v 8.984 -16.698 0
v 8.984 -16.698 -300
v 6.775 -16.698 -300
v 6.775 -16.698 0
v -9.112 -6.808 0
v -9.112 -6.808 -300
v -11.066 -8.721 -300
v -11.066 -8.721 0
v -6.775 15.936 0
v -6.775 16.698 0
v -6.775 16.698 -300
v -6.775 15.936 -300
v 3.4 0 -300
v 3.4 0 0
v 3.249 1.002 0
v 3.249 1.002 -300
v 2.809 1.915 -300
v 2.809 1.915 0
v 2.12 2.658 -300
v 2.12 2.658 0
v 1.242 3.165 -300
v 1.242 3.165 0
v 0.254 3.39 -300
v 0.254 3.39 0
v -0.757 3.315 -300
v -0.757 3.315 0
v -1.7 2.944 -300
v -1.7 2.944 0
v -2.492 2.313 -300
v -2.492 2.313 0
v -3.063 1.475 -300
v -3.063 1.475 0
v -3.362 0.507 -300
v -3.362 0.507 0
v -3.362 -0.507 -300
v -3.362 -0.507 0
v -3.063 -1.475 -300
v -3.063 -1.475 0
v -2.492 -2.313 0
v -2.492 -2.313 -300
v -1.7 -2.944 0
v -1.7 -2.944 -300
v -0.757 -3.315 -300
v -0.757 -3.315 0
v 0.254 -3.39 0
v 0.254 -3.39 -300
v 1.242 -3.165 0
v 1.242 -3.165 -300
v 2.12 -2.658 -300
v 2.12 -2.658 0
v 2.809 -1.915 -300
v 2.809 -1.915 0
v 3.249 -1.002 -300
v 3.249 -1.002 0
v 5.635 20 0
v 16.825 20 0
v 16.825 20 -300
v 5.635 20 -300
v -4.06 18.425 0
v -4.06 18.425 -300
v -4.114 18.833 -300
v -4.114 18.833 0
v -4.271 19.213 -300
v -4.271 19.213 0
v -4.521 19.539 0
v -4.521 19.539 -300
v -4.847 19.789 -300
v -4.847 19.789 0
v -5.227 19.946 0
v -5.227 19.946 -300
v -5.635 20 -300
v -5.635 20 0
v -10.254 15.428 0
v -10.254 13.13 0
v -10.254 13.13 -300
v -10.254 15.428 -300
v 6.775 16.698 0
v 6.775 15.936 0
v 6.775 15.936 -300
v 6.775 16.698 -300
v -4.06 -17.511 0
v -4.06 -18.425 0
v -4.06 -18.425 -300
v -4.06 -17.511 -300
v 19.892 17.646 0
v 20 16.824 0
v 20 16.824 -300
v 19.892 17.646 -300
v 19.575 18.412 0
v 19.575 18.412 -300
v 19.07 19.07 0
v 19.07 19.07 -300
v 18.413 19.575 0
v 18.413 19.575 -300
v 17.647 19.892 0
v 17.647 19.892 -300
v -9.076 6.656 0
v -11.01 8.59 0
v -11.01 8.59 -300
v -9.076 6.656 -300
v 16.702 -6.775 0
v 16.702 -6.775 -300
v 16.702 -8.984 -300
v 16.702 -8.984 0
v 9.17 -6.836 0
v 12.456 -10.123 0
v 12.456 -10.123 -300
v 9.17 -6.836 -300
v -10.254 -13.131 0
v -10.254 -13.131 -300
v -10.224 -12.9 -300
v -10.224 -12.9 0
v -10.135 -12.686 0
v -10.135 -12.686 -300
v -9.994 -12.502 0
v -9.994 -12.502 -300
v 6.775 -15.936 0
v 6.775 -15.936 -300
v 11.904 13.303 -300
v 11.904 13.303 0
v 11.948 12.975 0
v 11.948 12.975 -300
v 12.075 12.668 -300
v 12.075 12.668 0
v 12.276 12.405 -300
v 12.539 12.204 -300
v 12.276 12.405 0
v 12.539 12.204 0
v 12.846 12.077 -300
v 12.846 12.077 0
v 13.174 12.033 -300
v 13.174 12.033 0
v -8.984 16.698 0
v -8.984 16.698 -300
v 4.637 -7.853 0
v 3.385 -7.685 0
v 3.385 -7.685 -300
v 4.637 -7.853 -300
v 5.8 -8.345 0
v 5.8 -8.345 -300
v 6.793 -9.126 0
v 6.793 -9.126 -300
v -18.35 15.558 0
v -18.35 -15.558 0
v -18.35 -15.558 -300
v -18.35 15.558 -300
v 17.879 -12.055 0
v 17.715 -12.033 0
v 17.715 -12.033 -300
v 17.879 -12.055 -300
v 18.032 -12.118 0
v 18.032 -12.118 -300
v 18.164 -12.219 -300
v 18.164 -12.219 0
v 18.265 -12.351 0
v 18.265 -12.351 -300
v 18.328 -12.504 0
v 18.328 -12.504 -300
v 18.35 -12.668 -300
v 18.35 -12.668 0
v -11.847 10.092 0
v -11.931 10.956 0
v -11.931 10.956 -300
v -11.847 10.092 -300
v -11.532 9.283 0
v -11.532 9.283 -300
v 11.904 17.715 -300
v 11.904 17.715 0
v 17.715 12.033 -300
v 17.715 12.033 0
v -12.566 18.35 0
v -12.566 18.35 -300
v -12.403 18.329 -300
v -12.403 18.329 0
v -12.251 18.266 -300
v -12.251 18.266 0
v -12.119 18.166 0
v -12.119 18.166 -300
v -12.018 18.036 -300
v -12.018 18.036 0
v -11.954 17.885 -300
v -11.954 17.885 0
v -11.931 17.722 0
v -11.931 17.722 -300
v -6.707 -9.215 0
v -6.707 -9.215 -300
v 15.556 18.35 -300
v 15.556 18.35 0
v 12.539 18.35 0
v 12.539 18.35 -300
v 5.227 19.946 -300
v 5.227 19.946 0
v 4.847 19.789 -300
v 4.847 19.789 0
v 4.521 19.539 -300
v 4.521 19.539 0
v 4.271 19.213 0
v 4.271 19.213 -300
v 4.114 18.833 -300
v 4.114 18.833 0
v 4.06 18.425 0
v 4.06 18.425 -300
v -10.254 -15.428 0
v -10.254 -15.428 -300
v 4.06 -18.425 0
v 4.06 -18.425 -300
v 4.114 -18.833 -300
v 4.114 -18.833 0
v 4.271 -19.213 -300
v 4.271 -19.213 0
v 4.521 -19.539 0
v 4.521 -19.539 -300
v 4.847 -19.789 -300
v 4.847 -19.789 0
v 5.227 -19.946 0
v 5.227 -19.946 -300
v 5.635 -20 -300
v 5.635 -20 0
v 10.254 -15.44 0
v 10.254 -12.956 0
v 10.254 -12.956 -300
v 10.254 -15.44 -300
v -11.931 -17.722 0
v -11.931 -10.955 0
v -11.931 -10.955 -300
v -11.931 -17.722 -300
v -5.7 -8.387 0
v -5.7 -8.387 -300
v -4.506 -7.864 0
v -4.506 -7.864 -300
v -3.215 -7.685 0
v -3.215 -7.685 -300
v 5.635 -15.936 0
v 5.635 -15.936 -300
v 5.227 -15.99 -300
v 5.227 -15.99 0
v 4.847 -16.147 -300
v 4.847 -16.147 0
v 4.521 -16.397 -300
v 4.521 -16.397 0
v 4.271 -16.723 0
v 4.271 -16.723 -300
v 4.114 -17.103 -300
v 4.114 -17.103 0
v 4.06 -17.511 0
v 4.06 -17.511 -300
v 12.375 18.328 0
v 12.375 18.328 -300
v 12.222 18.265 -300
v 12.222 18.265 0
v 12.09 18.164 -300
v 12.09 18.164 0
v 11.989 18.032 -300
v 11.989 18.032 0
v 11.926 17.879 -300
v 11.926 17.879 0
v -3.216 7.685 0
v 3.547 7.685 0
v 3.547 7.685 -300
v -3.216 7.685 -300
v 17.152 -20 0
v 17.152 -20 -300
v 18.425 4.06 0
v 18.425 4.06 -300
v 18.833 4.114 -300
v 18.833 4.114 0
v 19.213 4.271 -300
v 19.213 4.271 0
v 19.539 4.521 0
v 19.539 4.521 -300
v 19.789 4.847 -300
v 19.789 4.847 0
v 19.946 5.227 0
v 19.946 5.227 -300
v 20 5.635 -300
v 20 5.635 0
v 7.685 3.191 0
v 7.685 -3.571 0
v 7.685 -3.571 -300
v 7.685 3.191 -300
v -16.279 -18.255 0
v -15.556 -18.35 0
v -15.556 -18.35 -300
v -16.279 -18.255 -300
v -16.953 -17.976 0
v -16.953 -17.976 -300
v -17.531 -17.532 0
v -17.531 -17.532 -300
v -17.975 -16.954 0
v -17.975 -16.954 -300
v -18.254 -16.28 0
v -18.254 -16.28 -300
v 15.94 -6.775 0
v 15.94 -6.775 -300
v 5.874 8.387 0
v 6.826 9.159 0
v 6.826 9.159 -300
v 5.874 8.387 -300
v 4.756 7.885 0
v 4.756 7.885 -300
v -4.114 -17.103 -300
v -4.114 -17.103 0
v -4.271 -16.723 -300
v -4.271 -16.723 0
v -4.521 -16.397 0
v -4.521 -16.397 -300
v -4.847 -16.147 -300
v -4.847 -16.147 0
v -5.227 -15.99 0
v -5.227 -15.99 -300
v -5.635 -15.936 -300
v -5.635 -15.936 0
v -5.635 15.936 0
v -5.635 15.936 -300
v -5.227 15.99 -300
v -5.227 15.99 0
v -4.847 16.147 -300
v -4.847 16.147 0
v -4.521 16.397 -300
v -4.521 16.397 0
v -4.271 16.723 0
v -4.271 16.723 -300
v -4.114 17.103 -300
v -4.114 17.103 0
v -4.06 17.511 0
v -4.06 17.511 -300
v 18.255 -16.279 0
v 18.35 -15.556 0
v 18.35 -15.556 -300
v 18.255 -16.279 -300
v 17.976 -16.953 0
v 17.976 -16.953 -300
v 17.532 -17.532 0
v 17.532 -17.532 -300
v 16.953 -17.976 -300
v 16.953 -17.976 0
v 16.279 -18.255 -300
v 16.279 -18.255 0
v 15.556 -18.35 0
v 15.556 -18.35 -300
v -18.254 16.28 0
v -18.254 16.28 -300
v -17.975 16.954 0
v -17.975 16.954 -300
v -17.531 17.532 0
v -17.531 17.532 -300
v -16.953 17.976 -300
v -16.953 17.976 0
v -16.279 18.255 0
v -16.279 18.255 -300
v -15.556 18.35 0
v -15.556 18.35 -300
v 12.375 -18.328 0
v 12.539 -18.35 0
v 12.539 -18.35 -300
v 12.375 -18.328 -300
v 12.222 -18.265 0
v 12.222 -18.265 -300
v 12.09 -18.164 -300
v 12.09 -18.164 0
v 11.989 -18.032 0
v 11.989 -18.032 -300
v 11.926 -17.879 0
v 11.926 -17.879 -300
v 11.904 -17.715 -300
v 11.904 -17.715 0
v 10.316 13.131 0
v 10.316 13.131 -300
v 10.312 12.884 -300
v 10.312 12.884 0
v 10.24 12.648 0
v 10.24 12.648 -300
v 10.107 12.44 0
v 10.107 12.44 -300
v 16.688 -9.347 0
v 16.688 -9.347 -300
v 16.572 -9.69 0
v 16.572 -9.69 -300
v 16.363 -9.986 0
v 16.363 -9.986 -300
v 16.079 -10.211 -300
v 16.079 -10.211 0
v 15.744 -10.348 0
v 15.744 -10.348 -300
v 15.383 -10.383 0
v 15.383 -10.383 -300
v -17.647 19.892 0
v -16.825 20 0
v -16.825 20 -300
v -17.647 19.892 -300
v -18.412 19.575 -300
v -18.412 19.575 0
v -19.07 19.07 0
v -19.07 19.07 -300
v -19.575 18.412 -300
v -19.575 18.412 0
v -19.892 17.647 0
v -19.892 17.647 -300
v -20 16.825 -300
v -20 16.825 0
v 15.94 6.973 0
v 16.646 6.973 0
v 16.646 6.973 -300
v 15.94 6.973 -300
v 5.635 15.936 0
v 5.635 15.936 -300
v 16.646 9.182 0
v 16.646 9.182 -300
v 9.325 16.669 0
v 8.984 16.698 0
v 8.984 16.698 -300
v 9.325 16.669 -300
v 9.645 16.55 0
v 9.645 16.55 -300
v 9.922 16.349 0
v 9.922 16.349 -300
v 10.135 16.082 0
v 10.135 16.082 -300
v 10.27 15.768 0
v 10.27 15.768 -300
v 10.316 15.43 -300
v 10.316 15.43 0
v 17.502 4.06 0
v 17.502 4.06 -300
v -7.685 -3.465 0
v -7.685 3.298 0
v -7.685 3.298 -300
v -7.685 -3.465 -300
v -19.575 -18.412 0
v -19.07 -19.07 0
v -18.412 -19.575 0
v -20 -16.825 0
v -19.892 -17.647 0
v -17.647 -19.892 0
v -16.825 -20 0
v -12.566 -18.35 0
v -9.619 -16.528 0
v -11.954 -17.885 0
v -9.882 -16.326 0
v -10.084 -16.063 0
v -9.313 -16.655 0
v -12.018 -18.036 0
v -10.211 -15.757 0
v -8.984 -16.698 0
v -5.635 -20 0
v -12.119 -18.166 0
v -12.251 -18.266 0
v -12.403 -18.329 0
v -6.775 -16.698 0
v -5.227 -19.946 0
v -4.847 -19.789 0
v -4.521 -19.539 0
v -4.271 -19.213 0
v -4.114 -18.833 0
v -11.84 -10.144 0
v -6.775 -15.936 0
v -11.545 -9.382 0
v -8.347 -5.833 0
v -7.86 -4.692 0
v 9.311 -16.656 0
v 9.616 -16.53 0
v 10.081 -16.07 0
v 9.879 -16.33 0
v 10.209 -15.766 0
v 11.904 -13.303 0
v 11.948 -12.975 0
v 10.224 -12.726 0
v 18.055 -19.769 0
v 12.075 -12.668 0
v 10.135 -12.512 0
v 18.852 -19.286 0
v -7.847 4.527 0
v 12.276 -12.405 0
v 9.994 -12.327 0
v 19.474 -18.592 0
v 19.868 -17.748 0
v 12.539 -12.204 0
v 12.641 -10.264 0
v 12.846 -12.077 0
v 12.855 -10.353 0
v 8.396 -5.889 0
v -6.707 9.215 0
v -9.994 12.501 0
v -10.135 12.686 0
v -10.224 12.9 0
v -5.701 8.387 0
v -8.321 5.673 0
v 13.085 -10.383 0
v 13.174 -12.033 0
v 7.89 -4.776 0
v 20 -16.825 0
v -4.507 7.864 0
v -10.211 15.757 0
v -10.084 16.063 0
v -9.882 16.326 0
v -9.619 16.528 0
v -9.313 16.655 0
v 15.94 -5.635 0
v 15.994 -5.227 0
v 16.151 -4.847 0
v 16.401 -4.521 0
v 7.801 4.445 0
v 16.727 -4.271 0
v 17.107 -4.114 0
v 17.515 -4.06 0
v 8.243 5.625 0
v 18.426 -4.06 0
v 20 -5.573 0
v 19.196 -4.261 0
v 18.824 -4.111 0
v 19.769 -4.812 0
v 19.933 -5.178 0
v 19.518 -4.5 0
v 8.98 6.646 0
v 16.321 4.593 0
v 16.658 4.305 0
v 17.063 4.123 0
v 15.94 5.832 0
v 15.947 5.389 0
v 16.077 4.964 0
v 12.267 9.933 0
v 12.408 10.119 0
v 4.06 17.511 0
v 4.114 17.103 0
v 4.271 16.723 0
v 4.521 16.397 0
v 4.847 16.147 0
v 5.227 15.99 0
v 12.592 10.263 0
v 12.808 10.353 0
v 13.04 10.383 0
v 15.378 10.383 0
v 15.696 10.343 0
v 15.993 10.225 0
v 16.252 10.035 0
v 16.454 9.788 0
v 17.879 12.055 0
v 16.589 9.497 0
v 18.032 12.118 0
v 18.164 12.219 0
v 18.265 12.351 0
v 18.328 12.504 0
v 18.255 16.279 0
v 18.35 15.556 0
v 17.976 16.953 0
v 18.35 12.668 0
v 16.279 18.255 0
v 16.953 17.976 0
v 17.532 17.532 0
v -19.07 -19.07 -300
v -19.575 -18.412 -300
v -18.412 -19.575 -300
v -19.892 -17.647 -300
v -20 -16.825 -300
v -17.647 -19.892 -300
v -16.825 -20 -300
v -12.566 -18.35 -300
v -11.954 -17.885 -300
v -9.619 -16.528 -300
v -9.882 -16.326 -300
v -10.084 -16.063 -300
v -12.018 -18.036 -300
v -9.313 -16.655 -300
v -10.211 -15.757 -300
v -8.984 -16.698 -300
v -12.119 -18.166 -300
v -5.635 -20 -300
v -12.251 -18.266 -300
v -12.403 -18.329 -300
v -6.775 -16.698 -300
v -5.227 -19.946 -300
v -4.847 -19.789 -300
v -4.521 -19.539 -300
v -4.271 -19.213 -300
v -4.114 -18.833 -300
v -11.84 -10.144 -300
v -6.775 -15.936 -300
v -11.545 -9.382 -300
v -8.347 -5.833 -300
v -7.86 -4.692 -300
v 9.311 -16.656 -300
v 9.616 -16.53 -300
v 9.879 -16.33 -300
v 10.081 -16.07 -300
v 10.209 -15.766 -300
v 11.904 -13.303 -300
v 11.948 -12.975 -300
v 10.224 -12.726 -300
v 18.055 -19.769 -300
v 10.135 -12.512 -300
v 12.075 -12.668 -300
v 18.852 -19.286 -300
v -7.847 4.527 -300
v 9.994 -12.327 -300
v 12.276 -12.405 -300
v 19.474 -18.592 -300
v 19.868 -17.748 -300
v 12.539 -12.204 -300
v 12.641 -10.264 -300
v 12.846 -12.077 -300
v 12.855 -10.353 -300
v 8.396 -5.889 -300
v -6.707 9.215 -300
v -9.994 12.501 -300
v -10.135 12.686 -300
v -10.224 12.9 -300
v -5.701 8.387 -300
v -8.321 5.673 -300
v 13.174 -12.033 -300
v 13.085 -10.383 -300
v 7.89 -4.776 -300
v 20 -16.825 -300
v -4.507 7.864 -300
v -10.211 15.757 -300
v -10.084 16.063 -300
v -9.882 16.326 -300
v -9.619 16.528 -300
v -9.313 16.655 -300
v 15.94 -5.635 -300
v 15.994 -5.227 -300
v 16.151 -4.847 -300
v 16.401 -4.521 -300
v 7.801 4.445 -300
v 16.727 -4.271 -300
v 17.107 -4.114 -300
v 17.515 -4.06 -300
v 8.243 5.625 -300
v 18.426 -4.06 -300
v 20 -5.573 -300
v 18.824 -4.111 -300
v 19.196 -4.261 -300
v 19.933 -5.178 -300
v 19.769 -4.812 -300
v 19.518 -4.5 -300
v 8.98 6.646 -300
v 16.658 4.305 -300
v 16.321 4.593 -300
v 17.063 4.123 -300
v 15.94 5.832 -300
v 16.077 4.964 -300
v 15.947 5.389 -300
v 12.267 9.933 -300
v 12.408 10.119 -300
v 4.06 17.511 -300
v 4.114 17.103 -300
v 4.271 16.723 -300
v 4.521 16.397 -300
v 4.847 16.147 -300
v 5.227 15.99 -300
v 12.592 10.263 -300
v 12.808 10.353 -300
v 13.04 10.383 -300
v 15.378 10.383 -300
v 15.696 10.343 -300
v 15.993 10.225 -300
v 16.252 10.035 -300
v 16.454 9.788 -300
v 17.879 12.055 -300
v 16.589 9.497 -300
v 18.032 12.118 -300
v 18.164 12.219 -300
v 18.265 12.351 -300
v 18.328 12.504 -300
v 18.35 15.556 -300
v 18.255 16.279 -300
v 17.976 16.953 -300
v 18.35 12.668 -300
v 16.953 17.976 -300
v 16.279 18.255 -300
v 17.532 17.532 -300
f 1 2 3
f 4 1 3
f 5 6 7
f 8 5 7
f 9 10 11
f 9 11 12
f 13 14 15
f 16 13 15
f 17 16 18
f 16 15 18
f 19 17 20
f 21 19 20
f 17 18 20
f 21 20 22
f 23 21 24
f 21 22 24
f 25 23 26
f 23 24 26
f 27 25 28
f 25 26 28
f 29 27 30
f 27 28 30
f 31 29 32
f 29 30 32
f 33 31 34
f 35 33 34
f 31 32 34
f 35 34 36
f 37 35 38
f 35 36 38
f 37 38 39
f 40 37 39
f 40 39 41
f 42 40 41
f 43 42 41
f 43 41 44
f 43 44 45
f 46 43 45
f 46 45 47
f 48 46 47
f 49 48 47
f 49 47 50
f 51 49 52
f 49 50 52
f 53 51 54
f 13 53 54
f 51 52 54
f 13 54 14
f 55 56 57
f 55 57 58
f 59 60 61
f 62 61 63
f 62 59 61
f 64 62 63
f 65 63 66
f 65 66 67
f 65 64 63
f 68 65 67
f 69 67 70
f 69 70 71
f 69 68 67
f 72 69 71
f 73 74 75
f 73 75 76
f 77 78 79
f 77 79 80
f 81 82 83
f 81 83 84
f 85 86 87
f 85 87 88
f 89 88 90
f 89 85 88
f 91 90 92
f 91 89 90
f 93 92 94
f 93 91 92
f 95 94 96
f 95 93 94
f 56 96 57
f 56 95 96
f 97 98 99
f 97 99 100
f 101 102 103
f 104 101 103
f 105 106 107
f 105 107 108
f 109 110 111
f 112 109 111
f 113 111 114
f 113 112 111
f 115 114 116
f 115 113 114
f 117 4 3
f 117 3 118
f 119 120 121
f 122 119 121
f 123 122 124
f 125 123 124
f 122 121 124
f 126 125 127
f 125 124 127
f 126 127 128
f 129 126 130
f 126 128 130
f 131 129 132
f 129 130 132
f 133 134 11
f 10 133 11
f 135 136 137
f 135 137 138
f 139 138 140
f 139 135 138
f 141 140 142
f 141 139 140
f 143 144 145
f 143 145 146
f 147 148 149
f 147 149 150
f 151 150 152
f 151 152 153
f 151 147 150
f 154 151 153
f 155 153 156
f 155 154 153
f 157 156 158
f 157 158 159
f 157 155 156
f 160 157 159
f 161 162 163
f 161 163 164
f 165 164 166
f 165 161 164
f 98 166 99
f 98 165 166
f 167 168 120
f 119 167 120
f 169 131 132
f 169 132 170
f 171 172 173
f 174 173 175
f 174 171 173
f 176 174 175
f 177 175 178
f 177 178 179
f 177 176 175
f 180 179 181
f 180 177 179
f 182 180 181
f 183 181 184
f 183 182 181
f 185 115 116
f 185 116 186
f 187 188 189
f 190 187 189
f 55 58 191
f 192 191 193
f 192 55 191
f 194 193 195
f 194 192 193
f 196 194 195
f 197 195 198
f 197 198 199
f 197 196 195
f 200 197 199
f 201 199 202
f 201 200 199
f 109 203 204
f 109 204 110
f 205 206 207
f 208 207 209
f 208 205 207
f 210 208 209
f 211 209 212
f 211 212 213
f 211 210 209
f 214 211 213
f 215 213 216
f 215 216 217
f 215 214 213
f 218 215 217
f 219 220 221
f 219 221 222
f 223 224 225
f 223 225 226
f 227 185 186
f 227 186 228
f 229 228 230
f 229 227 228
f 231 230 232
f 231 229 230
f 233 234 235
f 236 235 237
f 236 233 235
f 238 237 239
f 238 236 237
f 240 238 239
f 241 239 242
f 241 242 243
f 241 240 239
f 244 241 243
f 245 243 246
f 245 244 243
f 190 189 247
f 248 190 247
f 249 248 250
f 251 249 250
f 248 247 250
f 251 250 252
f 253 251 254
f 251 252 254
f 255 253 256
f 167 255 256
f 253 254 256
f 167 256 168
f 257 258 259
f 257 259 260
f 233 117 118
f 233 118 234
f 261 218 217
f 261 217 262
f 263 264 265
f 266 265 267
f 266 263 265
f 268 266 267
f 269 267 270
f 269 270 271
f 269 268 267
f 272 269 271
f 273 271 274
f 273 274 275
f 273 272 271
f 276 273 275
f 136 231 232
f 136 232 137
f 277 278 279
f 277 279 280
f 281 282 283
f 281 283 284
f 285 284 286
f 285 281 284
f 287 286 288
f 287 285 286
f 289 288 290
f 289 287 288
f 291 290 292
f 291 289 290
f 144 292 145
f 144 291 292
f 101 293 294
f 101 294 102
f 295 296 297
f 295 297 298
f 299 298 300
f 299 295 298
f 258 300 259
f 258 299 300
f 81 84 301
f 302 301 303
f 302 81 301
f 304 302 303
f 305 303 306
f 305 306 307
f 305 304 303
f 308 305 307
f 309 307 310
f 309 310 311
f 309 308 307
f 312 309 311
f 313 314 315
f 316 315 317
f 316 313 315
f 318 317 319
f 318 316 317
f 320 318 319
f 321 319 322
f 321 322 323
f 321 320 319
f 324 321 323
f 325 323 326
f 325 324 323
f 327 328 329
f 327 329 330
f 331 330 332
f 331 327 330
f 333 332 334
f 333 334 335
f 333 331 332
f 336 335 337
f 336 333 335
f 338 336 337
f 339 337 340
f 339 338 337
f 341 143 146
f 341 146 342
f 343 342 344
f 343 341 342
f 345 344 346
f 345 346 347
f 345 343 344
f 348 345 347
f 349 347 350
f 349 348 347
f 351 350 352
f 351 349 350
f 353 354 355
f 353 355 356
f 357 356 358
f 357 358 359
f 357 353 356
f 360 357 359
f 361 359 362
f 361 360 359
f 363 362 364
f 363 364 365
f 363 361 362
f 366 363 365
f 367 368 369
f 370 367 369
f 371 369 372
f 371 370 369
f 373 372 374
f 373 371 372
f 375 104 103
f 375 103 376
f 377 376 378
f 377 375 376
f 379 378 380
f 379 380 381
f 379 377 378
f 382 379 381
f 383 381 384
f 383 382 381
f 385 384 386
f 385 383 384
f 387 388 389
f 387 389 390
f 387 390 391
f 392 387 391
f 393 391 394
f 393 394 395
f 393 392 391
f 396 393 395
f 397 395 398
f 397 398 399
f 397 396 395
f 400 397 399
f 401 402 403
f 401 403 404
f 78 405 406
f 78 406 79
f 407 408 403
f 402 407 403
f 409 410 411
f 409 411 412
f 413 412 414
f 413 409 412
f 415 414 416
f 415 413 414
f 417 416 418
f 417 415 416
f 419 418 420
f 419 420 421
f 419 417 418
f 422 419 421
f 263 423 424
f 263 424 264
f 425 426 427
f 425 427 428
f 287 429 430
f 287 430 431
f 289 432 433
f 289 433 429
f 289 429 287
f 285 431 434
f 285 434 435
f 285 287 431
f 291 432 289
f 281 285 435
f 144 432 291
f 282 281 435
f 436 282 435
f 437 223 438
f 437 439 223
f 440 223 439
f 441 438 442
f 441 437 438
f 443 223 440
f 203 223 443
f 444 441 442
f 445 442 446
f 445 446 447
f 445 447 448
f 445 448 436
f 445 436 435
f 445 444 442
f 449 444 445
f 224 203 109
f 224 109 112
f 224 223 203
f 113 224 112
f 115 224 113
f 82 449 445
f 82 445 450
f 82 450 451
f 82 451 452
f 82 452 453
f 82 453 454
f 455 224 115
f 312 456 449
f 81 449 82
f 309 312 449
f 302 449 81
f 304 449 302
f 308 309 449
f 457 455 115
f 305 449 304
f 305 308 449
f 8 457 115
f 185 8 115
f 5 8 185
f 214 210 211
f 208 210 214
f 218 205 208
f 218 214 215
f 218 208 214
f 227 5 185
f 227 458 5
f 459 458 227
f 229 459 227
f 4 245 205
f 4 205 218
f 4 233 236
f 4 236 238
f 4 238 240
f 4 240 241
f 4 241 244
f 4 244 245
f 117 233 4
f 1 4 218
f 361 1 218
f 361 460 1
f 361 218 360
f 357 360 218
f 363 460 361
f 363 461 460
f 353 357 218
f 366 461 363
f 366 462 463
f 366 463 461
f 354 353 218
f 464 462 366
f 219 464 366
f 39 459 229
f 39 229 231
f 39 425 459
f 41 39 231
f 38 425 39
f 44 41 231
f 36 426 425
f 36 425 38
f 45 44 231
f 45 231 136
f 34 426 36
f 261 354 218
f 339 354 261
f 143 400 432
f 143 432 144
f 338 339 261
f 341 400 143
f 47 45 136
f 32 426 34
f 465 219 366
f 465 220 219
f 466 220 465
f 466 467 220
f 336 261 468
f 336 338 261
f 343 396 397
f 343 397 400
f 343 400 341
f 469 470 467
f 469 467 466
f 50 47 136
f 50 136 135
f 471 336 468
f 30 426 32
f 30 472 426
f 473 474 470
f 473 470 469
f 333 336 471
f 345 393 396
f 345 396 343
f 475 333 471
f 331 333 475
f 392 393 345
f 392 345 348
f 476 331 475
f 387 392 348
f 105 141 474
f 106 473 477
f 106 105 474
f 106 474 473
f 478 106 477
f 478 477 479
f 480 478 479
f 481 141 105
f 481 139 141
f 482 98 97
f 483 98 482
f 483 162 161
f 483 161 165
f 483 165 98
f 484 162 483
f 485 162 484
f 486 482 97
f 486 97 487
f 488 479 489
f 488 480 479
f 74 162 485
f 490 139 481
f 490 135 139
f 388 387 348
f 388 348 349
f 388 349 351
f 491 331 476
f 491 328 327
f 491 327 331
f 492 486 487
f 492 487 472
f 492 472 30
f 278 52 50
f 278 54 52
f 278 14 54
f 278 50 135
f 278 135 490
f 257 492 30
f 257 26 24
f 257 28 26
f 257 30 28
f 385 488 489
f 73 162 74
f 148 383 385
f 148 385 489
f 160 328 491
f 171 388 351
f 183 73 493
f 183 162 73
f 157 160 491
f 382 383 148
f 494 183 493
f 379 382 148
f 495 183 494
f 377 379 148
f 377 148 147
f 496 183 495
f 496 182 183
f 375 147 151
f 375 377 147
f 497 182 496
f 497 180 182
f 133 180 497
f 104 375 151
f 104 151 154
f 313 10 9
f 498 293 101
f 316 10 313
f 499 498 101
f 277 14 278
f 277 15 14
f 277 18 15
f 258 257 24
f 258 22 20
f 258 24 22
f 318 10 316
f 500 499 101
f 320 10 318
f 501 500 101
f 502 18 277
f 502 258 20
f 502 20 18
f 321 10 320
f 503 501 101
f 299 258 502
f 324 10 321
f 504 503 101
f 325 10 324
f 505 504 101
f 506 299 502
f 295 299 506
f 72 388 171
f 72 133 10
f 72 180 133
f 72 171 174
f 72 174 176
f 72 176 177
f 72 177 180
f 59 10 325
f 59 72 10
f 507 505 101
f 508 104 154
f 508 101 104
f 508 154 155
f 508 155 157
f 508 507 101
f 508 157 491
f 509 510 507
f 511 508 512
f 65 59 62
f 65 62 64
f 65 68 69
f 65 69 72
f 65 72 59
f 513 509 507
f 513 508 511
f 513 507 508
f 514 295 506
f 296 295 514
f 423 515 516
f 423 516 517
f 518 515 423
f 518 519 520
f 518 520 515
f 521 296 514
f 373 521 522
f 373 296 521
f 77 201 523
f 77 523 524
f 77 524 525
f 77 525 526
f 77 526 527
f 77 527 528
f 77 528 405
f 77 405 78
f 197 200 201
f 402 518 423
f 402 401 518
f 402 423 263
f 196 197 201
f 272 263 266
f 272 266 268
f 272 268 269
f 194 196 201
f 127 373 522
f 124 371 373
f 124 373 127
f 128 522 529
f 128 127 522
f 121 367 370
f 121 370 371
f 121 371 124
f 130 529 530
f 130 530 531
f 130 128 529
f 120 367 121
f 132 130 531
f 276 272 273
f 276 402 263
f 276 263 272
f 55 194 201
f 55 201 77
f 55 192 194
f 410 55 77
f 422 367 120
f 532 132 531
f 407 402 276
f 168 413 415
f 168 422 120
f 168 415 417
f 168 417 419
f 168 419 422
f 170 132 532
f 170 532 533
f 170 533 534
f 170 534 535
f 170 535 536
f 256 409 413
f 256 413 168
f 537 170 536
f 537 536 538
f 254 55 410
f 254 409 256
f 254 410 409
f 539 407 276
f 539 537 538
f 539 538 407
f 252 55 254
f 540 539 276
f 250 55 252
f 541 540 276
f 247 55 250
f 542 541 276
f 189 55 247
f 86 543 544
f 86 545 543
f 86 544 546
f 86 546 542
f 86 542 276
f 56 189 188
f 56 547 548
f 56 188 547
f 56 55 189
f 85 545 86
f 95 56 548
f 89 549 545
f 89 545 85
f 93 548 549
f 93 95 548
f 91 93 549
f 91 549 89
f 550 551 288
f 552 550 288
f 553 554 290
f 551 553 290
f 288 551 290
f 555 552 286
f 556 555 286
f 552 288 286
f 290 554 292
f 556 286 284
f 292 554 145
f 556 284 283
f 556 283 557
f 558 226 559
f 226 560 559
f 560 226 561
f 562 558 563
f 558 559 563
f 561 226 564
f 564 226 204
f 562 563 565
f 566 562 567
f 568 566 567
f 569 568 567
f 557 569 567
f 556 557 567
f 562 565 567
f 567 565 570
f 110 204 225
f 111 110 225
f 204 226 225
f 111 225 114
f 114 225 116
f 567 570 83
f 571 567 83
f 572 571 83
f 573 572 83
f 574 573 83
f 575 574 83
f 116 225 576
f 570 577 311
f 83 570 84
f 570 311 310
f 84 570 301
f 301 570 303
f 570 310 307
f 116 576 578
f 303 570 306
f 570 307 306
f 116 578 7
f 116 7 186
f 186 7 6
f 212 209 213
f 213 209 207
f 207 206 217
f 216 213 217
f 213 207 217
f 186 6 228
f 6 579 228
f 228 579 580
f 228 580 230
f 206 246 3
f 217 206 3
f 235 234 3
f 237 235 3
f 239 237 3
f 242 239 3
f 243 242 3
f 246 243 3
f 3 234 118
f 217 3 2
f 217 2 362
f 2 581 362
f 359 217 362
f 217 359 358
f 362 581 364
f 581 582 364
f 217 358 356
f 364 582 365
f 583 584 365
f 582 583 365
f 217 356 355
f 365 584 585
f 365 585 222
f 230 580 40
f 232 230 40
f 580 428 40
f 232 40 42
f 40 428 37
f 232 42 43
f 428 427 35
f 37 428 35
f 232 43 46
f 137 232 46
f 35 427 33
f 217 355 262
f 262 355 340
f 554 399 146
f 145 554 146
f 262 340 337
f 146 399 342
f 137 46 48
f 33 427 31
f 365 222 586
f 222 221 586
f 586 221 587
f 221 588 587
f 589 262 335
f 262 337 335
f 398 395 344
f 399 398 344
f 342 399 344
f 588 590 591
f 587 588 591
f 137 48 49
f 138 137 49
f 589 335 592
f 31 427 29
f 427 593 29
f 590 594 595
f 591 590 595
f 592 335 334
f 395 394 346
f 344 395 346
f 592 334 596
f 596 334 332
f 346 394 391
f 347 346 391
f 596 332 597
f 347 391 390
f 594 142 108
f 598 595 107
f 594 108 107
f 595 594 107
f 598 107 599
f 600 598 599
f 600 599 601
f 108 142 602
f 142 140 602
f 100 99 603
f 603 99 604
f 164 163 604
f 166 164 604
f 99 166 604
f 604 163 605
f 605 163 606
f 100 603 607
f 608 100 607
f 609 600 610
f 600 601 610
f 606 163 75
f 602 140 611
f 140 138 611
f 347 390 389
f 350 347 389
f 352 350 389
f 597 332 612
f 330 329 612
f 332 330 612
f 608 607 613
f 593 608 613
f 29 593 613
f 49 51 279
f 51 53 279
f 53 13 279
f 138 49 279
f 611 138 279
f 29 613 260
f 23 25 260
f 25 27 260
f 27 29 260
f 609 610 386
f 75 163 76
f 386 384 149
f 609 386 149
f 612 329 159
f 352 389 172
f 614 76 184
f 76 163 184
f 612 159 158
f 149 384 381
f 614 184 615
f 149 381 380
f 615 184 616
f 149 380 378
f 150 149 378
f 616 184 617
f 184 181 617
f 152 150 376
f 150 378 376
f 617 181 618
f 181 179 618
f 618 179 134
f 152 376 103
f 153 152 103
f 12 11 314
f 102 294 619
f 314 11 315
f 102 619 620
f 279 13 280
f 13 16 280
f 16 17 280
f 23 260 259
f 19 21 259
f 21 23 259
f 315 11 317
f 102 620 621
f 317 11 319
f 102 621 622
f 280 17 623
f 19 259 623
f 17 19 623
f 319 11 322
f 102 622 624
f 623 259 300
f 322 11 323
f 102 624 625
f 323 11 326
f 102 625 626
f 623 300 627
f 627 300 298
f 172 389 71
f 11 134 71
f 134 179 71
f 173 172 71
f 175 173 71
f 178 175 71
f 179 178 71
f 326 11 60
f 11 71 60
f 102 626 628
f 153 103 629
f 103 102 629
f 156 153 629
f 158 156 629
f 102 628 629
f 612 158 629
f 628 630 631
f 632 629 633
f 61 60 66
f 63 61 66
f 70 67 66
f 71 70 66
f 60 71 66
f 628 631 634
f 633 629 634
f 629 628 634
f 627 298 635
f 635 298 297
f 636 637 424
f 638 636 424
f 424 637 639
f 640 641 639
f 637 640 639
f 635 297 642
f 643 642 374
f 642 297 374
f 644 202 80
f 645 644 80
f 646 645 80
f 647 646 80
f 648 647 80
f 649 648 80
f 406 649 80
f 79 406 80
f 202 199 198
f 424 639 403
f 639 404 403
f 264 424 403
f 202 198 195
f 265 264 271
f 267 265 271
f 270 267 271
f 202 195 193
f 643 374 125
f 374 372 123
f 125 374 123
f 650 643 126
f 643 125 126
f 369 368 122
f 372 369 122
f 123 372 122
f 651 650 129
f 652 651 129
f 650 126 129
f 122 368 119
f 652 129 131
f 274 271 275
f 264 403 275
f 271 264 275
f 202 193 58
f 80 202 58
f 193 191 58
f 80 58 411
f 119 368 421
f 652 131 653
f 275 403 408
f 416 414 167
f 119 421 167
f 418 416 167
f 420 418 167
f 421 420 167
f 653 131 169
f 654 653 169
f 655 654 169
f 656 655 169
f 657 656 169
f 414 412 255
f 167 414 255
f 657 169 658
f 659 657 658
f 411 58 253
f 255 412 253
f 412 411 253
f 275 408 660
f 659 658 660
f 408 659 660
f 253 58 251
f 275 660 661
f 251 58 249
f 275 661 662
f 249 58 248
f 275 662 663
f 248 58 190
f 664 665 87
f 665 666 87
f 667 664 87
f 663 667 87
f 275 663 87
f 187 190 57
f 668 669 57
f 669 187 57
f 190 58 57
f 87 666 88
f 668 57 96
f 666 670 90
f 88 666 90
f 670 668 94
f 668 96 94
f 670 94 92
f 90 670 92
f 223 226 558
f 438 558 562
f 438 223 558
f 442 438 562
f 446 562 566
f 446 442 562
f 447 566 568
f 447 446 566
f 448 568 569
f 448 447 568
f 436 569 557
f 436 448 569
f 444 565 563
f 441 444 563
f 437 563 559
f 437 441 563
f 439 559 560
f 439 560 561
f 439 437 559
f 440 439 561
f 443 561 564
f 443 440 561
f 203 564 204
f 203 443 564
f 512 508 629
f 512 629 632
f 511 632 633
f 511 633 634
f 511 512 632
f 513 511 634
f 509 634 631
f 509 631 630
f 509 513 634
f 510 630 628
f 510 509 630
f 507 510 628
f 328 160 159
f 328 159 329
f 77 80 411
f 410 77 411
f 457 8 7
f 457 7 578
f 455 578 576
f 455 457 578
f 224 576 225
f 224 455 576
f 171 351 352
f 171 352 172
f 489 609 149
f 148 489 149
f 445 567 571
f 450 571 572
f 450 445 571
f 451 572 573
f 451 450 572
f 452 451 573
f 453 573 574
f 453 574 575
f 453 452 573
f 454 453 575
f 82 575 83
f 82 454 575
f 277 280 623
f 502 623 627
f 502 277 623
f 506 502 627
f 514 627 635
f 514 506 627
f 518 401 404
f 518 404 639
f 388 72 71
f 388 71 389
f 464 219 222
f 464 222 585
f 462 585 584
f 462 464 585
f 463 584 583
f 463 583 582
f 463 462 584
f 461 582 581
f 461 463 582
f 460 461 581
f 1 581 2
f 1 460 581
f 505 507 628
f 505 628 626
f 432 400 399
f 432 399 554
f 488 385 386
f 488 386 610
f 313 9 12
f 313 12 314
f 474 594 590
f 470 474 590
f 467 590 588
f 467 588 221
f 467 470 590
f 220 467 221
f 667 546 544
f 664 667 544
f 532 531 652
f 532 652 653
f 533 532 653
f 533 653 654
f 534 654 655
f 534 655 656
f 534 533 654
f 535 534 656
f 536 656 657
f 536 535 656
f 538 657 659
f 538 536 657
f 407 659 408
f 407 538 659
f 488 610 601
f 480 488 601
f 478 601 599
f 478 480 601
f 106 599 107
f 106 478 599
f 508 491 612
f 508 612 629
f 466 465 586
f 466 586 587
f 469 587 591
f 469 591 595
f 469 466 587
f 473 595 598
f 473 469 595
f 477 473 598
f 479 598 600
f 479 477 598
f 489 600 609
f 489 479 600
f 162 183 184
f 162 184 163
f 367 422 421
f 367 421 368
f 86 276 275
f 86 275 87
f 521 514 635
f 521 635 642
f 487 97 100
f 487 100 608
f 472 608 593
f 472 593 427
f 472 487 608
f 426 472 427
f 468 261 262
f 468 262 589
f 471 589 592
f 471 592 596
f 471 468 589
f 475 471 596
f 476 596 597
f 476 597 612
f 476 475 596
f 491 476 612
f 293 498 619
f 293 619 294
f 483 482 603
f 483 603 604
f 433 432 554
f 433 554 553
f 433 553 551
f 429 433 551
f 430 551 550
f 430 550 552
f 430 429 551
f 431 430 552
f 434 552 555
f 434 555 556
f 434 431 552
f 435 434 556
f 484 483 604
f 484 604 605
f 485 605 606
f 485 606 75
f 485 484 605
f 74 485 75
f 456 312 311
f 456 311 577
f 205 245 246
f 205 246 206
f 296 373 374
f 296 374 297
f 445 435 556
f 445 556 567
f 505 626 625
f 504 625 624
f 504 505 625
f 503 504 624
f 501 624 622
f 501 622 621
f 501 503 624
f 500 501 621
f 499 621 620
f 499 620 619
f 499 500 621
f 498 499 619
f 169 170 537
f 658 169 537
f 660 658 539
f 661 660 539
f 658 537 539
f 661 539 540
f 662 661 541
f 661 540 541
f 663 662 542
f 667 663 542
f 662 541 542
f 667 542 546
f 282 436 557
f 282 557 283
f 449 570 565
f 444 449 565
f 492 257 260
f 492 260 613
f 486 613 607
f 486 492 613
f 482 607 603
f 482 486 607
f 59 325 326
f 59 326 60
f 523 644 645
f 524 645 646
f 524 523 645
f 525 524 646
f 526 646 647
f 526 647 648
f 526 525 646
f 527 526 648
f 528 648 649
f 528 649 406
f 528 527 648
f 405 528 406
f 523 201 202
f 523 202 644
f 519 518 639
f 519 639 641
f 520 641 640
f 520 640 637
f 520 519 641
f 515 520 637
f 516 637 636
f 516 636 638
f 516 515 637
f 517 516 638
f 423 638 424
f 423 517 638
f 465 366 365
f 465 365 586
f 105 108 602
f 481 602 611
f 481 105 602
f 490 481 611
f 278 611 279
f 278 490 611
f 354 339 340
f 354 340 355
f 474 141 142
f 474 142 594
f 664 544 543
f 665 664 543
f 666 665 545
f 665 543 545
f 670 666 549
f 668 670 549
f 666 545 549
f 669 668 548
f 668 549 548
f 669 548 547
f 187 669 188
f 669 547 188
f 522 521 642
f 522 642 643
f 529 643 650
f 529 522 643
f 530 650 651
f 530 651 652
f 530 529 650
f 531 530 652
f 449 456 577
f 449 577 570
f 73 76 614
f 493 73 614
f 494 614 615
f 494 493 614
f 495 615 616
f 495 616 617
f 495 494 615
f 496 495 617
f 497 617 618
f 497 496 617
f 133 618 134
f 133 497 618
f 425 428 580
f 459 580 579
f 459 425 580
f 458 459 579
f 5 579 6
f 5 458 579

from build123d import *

# Parameters (mm, degrees)
SKETCH1_R      = 3.4
EXTRUDE1_DEPTH = 300


with BuildPart() as part:
    # Sketch1 → Extrude1 (new body)
    with BuildSketch(Plane.XY):
        with BuildLine():
            Line((3.546734719, 7.685), (-3.215668941, 7.685))
            ThreePointArc((-3.215668941, 7.685), (-5.12166397, 8.084192802), (-6.707283616, 9.214671586))
            Line((-6.707283616, 9.214671586), (-9.994083925, 12.501471895))
            ThreePointArc((-9.994083925, 12.501471895), (-10.186794901, 12.789884252), (-10.254465997, 13.130089823))
            Line((-10.254465997, 13.130089823), (-10.254465997, 15.428464473))
            ThreePointArc((-10.254465997, 15.428464473), (-9.882491609, 16.326490085), (-8.984465997, 16.698464473))
            Line((-8.984465997, 16.698464473), (-6.775217878, 16.698464473))
            Line((-6.775217878, 16.698464473), (-6.775217878, 15.936))
            Line((-6.775217878, 15.936), (-5.6348, 15.936))
            ThreePointArc((-5.6348, 15.936), (-4.521248241, 16.397248241), (-4.06, 17.5108))
            Line((-4.06, 17.5108), (-4.06, 18.4252))
            ThreePointArc((-4.06, 18.4252), (-4.521248241, 19.538751759), (-5.6348, 20))
            Line((-5.6348, 20), (-13.0175, 20))
            Line((-13.0175, 20), (-16.825, 20))
            ThreePointArc((-16.825, 20), (-19.07006403, 19.07006403), (-20, 16.825))
            Line((-20, 16.825), (-20, -16.825))
            ThreePointArc((-20, -16.825), (-19.07006403, -19.07006403), (-16.825, -20))
            Line((-16.825, -20), (-13.0175, -20))
            Line((-13.0175, -20), (-5.6348, -20))
            ThreePointArc((-5.6348, -20), (-4.521248241, -19.538751759), (-4.06, -18.4252))
            Line((-4.06, -18.4252), (-4.06, -17.5108))
            ThreePointArc((-4.06, -17.5108), (-4.521248241, -16.397248241), (-5.6348, -15.936))
            Line((-5.6348, -15.936), (-6.775217878, -15.936))
            Line((-6.775217878, -15.936), (-6.775217878, -16.698464473))
            Line((-6.775217878, -16.698464473), (-8.984465997, -16.698464473))
            ThreePointArc((-8.984465997, -16.698464473), (-9.882491609, -16.326490085), (-10.254465997, -15.428464473))
            Line((-10.254465997, -15.428464473), (-10.254465997, -13.130554296))
            ThreePointArc((-10.254465997, -13.130554296), (-10.186794901, -12.790348725), (-9.994083925, -12.501936368))
            Line((-9.994083925, -12.501936368), (-6.707283616, -9.215136058))
            ThreePointArc((-6.707283616, -9.215136058), (-5.121525017, -8.084319577), (-3.21524064, -7.685))
            Line((-3.21524064, -7.685), (3.384844934, -7.685))
            ThreePointArc((3.384844934, -7.685), (5.234788394, -8.060064667), (6.792572846, -9.126025224))
            Line((6.792572846, -9.126025224), (9.994035567, -12.327487945))
            ThreePointArc((9.994035567, -12.327487945), (10.186746543, -12.615900302), (10.254417639, -12.956105874))
            Line((10.254417639, -12.956105874), (10.254417639, -15.439547173))
            ThreePointArc((10.254417639, -15.439547173), (9.878564697, -16.3303999), (8.984465997, -16.698464473))
            Line((8.984465997, -16.698464473), (6.775217878, -16.698464473))
            Line((6.775217878, -16.698464473), (6.775217878, -15.936))
            Line((6.775217878, -15.936), (5.6348, -15.936))
            ThreePointArc((5.6348, -15.936), (4.521248241, -16.397248241), (4.06, -17.5108))
            Line((4.06, -17.5108), (4.06, -18.4252))
            ThreePointArc((4.06, -18.4252), (4.521248241, -19.538751759), (5.6348, -20))
            Line((5.6348, -20), (13.34169248, -20))
            Line((13.34169248, -20), (17.15169248, -20))
            ThreePointArc((17.15169248, -20), (19.188402964, -18.962027535), (20, -16.825))
            Line((20, -16.825), (20, -13.015))
            Line((20, -13.015), (20, -5.5728))
            ThreePointArc((20, -5.5728), (19.517832289, -4.499539536), (18.426420946, -4.06))
            Line((18.426420946, -4.06), (17.5148, -4.06))
            ThreePointArc((17.5148, -4.06), (16.401248241, -4.521248241), (15.94, -5.6348))
            Line((15.94, -5.6348), (15.94, -6.775217878))
            Line((15.94, -6.775217878), (16.702464473, -6.775217878))
            Line((16.702464473, -6.775217878), (16.702464473, -8.984465997))
            ThreePointArc((16.702464473, -8.984465997), (16.363032482, -9.986041481), (15.382992443, -10.383394031))
            Line((15.382992443, -10.383394031), (13.085082266, -10.383394031))
            ThreePointArc((13.085082266, -10.383394031), (12.744876695, -10.315722936), (12.456464338, -10.12301196))
            Line((12.456464338, -10.12301196), (9.169664028, -6.83621165))
            ThreePointArc((9.169664028, -6.83621165), (8.107276575, -5.34917353), (7.685, -3.571075679))
            Line((7.685, -3.571075679), (7.685, 3.191327981))
            ThreePointArc((7.685, 3.191327981), (7.983205038, 5.049694415), (8.979790179, 6.646337802))
            Line((8.979790179, 6.646337802), (12.266590489, 9.933138111))
            ThreePointArc((12.266590489, 9.933138111), (12.592412986, 10.262627227), (13.039781689, 10.383394031))
            Line((13.039781689, 10.383394031), (15.37809843, 10.383394031))
            ThreePointArc((15.37809843, 10.383394031), (16.251511682, 10.035375209), (16.646241073, 9.182054333))
            Line((16.646241073, 9.182054333), (16.646241073, 6.972806215))
            Line((16.646241073, 6.972806215), (15.94, 6.972806215))
            Line((15.94, 6.972806215), (15.94, 5.832388337))
            ThreePointArc((15.94, 5.832388337), (16.321009151, 4.593446811), (17.502355238, 4.06))
            Line((17.502355238, 4.06), (18.4252, 4.06))
            ThreePointArc((18.4252, 4.06), (19.538751759, 4.521248241), (20, 5.6348))
            Line((20, 5.6348), (20, 13.01422635))
            Line((20, 13.01422635), (20, 16.82422635))
            ThreePointArc((20, 16.82422635), (19.070337634, 19.069790487), (16.825000094, 20))
            Line((16.825000094, 20), (13.290515583, 20))
            Line((13.290515583, 20), (5.6348, 20))
            ThreePointArc((5.6348, 20), (4.521248241, 19.538751759), (4.06, 18.4252))
            Line((4.06, 18.4252), (4.06, 17.5108))
            ThreePointArc((4.06, 17.5108), (4.521248241, 16.397248241), (5.6348, 15.936))
            Line((5.6348, 15.936), (6.775217878, 15.936))
            Line((6.775217878, 15.936), (6.775217878, 16.698464473))
            Line((6.775217878, 16.698464473), (8.984465997, 16.698464473))
            ThreePointArc((8.984465997, 16.698464473), (9.921702832, 16.349296475), (10.315534003, 15.429933551))
            Line((10.315534003, 15.429933551), (10.315534003, 13.130863473))
            ThreePointArc((10.315534003, 13.130863473), (10.284388293, 12.763467996), (10.106856362, 12.44030874))
            Line((10.106856362, 12.44030874), (6.825600792, 9.15905317))
            ThreePointArc((6.825600792, 9.15905317), (5.331011713, 8.099837434), (3.546734719, 7.685))
        make_face()
        Circle(SKETCH1_R, mode=Mode.SUBTRACT)
        with BuildLine():
            Line((11.904417639, 17.715), (11.904417639, 13.303394031))
            ThreePointArc((11.904417639, 13.303394031), (12.276392027, 12.405368419), (13.174417639, 12.033394031))
            Line((13.174417639, 12.033394031), (17.715, 12.033394031))
            ThreePointArc((17.715, 12.033394031), (18.164012806, 12.219381225), (18.35, 12.668394031))
            Line((18.35, 12.668394031), (18.35, 15.556))
            ThreePointArc((18.35, 15.556), (17.531656347, 17.531656347), (15.556, 18.35))
            Line((15.556, 18.35), (12.539417639, 18.35))
            ThreePointArc((12.539417639, 18.35), (12.090404833, 18.164012806), (11.904417639, 17.715))
        make_face(mode=Mode.SUBTRACT)
        with BuildLine():
            Line((-12.566039342, -18.35), (-15.556000403, -18.35))
            ThreePointArc((-15.556000403, -18.35), (-17.531126348, -17.532186606), (-18.35, -15.5575))
            Line((-18.35, -15.5575), (-18.35, 15.5575))
            ThreePointArc((-18.35, 15.5575), (-17.531126348, 17.532186606), (-15.556000403, 18.35))
            Line((-15.556000403, 18.35), (-12.566039304, 18.35))
            ThreePointArc((-12.566039304, 18.35), (-12.11943409, 18.166407557), (-11.931075623, 17.721791441))
            Line((-11.931075623, 17.721791441), (-11.931075623, 10.955502483))
            ThreePointArc((-11.931075623, 10.955502483), (-11.717102891, 9.676453683), (-11.00956403, 8.589651528))
            Line((-11.00956403, 8.589651528), (-9.076184211, 6.656271709))
            ThreePointArc((-9.076184211, 6.656271709), (-8.046556996, 5.115325687), (-7.685, 3.29765592))
            Line((-7.685, 3.29765592), (-7.685, -3.46474774))
            ThreePointArc((-7.685, -3.46474774), (-8.065971567, -5.27844769), (-9.112016323, -6.808296445))
            Line((-9.112016323, -6.808296445), (-11.065958077, -8.720893286))
            ThreePointArc((-11.065958077, -8.720893286), (-11.717420577, -9.753448518), (-11.931075623, -10.95549894))
            Line((-11.931075623, -10.95549894), (-11.931075623, -17.721787898))
            ThreePointArc((-11.931075623, -17.721787898), (-12.119432868, -18.166406311), (-12.566039342, -18.35))
        make_face(mode=Mode.SUBTRACT)
        with BuildLine():
            Line((15.556, -18.35), (12.539417639, -18.35))
            ThreePointArc((12.539417639, -18.35), (12.090404833, -18.164012806), (11.904417639, -17.715))
            Line((11.904417639, -17.715), (11.904417639, -13.303394031))
            ThreePointArc((11.904417639, -13.303394031), (12.276392027, -12.405368419), (13.174417639, -12.033394031))
            Line((13.174417639, -12.033394031), (17.715, -12.033394031))
            ThreePointArc((17.715, -12.033394031), (18.164012806, -12.219381225), (18.35, -12.668394031))
            Line((18.35, -12.668394031), (18.35, -15.556))
            ThreePointArc((18.35, -15.556), (17.531656347, -17.531656347), (15.556, -18.35))
        make_face(mode=Mode.SUBTRACT)
    extrude(amount=-EXTRUDE1_DEPTH)


solid = part.part
